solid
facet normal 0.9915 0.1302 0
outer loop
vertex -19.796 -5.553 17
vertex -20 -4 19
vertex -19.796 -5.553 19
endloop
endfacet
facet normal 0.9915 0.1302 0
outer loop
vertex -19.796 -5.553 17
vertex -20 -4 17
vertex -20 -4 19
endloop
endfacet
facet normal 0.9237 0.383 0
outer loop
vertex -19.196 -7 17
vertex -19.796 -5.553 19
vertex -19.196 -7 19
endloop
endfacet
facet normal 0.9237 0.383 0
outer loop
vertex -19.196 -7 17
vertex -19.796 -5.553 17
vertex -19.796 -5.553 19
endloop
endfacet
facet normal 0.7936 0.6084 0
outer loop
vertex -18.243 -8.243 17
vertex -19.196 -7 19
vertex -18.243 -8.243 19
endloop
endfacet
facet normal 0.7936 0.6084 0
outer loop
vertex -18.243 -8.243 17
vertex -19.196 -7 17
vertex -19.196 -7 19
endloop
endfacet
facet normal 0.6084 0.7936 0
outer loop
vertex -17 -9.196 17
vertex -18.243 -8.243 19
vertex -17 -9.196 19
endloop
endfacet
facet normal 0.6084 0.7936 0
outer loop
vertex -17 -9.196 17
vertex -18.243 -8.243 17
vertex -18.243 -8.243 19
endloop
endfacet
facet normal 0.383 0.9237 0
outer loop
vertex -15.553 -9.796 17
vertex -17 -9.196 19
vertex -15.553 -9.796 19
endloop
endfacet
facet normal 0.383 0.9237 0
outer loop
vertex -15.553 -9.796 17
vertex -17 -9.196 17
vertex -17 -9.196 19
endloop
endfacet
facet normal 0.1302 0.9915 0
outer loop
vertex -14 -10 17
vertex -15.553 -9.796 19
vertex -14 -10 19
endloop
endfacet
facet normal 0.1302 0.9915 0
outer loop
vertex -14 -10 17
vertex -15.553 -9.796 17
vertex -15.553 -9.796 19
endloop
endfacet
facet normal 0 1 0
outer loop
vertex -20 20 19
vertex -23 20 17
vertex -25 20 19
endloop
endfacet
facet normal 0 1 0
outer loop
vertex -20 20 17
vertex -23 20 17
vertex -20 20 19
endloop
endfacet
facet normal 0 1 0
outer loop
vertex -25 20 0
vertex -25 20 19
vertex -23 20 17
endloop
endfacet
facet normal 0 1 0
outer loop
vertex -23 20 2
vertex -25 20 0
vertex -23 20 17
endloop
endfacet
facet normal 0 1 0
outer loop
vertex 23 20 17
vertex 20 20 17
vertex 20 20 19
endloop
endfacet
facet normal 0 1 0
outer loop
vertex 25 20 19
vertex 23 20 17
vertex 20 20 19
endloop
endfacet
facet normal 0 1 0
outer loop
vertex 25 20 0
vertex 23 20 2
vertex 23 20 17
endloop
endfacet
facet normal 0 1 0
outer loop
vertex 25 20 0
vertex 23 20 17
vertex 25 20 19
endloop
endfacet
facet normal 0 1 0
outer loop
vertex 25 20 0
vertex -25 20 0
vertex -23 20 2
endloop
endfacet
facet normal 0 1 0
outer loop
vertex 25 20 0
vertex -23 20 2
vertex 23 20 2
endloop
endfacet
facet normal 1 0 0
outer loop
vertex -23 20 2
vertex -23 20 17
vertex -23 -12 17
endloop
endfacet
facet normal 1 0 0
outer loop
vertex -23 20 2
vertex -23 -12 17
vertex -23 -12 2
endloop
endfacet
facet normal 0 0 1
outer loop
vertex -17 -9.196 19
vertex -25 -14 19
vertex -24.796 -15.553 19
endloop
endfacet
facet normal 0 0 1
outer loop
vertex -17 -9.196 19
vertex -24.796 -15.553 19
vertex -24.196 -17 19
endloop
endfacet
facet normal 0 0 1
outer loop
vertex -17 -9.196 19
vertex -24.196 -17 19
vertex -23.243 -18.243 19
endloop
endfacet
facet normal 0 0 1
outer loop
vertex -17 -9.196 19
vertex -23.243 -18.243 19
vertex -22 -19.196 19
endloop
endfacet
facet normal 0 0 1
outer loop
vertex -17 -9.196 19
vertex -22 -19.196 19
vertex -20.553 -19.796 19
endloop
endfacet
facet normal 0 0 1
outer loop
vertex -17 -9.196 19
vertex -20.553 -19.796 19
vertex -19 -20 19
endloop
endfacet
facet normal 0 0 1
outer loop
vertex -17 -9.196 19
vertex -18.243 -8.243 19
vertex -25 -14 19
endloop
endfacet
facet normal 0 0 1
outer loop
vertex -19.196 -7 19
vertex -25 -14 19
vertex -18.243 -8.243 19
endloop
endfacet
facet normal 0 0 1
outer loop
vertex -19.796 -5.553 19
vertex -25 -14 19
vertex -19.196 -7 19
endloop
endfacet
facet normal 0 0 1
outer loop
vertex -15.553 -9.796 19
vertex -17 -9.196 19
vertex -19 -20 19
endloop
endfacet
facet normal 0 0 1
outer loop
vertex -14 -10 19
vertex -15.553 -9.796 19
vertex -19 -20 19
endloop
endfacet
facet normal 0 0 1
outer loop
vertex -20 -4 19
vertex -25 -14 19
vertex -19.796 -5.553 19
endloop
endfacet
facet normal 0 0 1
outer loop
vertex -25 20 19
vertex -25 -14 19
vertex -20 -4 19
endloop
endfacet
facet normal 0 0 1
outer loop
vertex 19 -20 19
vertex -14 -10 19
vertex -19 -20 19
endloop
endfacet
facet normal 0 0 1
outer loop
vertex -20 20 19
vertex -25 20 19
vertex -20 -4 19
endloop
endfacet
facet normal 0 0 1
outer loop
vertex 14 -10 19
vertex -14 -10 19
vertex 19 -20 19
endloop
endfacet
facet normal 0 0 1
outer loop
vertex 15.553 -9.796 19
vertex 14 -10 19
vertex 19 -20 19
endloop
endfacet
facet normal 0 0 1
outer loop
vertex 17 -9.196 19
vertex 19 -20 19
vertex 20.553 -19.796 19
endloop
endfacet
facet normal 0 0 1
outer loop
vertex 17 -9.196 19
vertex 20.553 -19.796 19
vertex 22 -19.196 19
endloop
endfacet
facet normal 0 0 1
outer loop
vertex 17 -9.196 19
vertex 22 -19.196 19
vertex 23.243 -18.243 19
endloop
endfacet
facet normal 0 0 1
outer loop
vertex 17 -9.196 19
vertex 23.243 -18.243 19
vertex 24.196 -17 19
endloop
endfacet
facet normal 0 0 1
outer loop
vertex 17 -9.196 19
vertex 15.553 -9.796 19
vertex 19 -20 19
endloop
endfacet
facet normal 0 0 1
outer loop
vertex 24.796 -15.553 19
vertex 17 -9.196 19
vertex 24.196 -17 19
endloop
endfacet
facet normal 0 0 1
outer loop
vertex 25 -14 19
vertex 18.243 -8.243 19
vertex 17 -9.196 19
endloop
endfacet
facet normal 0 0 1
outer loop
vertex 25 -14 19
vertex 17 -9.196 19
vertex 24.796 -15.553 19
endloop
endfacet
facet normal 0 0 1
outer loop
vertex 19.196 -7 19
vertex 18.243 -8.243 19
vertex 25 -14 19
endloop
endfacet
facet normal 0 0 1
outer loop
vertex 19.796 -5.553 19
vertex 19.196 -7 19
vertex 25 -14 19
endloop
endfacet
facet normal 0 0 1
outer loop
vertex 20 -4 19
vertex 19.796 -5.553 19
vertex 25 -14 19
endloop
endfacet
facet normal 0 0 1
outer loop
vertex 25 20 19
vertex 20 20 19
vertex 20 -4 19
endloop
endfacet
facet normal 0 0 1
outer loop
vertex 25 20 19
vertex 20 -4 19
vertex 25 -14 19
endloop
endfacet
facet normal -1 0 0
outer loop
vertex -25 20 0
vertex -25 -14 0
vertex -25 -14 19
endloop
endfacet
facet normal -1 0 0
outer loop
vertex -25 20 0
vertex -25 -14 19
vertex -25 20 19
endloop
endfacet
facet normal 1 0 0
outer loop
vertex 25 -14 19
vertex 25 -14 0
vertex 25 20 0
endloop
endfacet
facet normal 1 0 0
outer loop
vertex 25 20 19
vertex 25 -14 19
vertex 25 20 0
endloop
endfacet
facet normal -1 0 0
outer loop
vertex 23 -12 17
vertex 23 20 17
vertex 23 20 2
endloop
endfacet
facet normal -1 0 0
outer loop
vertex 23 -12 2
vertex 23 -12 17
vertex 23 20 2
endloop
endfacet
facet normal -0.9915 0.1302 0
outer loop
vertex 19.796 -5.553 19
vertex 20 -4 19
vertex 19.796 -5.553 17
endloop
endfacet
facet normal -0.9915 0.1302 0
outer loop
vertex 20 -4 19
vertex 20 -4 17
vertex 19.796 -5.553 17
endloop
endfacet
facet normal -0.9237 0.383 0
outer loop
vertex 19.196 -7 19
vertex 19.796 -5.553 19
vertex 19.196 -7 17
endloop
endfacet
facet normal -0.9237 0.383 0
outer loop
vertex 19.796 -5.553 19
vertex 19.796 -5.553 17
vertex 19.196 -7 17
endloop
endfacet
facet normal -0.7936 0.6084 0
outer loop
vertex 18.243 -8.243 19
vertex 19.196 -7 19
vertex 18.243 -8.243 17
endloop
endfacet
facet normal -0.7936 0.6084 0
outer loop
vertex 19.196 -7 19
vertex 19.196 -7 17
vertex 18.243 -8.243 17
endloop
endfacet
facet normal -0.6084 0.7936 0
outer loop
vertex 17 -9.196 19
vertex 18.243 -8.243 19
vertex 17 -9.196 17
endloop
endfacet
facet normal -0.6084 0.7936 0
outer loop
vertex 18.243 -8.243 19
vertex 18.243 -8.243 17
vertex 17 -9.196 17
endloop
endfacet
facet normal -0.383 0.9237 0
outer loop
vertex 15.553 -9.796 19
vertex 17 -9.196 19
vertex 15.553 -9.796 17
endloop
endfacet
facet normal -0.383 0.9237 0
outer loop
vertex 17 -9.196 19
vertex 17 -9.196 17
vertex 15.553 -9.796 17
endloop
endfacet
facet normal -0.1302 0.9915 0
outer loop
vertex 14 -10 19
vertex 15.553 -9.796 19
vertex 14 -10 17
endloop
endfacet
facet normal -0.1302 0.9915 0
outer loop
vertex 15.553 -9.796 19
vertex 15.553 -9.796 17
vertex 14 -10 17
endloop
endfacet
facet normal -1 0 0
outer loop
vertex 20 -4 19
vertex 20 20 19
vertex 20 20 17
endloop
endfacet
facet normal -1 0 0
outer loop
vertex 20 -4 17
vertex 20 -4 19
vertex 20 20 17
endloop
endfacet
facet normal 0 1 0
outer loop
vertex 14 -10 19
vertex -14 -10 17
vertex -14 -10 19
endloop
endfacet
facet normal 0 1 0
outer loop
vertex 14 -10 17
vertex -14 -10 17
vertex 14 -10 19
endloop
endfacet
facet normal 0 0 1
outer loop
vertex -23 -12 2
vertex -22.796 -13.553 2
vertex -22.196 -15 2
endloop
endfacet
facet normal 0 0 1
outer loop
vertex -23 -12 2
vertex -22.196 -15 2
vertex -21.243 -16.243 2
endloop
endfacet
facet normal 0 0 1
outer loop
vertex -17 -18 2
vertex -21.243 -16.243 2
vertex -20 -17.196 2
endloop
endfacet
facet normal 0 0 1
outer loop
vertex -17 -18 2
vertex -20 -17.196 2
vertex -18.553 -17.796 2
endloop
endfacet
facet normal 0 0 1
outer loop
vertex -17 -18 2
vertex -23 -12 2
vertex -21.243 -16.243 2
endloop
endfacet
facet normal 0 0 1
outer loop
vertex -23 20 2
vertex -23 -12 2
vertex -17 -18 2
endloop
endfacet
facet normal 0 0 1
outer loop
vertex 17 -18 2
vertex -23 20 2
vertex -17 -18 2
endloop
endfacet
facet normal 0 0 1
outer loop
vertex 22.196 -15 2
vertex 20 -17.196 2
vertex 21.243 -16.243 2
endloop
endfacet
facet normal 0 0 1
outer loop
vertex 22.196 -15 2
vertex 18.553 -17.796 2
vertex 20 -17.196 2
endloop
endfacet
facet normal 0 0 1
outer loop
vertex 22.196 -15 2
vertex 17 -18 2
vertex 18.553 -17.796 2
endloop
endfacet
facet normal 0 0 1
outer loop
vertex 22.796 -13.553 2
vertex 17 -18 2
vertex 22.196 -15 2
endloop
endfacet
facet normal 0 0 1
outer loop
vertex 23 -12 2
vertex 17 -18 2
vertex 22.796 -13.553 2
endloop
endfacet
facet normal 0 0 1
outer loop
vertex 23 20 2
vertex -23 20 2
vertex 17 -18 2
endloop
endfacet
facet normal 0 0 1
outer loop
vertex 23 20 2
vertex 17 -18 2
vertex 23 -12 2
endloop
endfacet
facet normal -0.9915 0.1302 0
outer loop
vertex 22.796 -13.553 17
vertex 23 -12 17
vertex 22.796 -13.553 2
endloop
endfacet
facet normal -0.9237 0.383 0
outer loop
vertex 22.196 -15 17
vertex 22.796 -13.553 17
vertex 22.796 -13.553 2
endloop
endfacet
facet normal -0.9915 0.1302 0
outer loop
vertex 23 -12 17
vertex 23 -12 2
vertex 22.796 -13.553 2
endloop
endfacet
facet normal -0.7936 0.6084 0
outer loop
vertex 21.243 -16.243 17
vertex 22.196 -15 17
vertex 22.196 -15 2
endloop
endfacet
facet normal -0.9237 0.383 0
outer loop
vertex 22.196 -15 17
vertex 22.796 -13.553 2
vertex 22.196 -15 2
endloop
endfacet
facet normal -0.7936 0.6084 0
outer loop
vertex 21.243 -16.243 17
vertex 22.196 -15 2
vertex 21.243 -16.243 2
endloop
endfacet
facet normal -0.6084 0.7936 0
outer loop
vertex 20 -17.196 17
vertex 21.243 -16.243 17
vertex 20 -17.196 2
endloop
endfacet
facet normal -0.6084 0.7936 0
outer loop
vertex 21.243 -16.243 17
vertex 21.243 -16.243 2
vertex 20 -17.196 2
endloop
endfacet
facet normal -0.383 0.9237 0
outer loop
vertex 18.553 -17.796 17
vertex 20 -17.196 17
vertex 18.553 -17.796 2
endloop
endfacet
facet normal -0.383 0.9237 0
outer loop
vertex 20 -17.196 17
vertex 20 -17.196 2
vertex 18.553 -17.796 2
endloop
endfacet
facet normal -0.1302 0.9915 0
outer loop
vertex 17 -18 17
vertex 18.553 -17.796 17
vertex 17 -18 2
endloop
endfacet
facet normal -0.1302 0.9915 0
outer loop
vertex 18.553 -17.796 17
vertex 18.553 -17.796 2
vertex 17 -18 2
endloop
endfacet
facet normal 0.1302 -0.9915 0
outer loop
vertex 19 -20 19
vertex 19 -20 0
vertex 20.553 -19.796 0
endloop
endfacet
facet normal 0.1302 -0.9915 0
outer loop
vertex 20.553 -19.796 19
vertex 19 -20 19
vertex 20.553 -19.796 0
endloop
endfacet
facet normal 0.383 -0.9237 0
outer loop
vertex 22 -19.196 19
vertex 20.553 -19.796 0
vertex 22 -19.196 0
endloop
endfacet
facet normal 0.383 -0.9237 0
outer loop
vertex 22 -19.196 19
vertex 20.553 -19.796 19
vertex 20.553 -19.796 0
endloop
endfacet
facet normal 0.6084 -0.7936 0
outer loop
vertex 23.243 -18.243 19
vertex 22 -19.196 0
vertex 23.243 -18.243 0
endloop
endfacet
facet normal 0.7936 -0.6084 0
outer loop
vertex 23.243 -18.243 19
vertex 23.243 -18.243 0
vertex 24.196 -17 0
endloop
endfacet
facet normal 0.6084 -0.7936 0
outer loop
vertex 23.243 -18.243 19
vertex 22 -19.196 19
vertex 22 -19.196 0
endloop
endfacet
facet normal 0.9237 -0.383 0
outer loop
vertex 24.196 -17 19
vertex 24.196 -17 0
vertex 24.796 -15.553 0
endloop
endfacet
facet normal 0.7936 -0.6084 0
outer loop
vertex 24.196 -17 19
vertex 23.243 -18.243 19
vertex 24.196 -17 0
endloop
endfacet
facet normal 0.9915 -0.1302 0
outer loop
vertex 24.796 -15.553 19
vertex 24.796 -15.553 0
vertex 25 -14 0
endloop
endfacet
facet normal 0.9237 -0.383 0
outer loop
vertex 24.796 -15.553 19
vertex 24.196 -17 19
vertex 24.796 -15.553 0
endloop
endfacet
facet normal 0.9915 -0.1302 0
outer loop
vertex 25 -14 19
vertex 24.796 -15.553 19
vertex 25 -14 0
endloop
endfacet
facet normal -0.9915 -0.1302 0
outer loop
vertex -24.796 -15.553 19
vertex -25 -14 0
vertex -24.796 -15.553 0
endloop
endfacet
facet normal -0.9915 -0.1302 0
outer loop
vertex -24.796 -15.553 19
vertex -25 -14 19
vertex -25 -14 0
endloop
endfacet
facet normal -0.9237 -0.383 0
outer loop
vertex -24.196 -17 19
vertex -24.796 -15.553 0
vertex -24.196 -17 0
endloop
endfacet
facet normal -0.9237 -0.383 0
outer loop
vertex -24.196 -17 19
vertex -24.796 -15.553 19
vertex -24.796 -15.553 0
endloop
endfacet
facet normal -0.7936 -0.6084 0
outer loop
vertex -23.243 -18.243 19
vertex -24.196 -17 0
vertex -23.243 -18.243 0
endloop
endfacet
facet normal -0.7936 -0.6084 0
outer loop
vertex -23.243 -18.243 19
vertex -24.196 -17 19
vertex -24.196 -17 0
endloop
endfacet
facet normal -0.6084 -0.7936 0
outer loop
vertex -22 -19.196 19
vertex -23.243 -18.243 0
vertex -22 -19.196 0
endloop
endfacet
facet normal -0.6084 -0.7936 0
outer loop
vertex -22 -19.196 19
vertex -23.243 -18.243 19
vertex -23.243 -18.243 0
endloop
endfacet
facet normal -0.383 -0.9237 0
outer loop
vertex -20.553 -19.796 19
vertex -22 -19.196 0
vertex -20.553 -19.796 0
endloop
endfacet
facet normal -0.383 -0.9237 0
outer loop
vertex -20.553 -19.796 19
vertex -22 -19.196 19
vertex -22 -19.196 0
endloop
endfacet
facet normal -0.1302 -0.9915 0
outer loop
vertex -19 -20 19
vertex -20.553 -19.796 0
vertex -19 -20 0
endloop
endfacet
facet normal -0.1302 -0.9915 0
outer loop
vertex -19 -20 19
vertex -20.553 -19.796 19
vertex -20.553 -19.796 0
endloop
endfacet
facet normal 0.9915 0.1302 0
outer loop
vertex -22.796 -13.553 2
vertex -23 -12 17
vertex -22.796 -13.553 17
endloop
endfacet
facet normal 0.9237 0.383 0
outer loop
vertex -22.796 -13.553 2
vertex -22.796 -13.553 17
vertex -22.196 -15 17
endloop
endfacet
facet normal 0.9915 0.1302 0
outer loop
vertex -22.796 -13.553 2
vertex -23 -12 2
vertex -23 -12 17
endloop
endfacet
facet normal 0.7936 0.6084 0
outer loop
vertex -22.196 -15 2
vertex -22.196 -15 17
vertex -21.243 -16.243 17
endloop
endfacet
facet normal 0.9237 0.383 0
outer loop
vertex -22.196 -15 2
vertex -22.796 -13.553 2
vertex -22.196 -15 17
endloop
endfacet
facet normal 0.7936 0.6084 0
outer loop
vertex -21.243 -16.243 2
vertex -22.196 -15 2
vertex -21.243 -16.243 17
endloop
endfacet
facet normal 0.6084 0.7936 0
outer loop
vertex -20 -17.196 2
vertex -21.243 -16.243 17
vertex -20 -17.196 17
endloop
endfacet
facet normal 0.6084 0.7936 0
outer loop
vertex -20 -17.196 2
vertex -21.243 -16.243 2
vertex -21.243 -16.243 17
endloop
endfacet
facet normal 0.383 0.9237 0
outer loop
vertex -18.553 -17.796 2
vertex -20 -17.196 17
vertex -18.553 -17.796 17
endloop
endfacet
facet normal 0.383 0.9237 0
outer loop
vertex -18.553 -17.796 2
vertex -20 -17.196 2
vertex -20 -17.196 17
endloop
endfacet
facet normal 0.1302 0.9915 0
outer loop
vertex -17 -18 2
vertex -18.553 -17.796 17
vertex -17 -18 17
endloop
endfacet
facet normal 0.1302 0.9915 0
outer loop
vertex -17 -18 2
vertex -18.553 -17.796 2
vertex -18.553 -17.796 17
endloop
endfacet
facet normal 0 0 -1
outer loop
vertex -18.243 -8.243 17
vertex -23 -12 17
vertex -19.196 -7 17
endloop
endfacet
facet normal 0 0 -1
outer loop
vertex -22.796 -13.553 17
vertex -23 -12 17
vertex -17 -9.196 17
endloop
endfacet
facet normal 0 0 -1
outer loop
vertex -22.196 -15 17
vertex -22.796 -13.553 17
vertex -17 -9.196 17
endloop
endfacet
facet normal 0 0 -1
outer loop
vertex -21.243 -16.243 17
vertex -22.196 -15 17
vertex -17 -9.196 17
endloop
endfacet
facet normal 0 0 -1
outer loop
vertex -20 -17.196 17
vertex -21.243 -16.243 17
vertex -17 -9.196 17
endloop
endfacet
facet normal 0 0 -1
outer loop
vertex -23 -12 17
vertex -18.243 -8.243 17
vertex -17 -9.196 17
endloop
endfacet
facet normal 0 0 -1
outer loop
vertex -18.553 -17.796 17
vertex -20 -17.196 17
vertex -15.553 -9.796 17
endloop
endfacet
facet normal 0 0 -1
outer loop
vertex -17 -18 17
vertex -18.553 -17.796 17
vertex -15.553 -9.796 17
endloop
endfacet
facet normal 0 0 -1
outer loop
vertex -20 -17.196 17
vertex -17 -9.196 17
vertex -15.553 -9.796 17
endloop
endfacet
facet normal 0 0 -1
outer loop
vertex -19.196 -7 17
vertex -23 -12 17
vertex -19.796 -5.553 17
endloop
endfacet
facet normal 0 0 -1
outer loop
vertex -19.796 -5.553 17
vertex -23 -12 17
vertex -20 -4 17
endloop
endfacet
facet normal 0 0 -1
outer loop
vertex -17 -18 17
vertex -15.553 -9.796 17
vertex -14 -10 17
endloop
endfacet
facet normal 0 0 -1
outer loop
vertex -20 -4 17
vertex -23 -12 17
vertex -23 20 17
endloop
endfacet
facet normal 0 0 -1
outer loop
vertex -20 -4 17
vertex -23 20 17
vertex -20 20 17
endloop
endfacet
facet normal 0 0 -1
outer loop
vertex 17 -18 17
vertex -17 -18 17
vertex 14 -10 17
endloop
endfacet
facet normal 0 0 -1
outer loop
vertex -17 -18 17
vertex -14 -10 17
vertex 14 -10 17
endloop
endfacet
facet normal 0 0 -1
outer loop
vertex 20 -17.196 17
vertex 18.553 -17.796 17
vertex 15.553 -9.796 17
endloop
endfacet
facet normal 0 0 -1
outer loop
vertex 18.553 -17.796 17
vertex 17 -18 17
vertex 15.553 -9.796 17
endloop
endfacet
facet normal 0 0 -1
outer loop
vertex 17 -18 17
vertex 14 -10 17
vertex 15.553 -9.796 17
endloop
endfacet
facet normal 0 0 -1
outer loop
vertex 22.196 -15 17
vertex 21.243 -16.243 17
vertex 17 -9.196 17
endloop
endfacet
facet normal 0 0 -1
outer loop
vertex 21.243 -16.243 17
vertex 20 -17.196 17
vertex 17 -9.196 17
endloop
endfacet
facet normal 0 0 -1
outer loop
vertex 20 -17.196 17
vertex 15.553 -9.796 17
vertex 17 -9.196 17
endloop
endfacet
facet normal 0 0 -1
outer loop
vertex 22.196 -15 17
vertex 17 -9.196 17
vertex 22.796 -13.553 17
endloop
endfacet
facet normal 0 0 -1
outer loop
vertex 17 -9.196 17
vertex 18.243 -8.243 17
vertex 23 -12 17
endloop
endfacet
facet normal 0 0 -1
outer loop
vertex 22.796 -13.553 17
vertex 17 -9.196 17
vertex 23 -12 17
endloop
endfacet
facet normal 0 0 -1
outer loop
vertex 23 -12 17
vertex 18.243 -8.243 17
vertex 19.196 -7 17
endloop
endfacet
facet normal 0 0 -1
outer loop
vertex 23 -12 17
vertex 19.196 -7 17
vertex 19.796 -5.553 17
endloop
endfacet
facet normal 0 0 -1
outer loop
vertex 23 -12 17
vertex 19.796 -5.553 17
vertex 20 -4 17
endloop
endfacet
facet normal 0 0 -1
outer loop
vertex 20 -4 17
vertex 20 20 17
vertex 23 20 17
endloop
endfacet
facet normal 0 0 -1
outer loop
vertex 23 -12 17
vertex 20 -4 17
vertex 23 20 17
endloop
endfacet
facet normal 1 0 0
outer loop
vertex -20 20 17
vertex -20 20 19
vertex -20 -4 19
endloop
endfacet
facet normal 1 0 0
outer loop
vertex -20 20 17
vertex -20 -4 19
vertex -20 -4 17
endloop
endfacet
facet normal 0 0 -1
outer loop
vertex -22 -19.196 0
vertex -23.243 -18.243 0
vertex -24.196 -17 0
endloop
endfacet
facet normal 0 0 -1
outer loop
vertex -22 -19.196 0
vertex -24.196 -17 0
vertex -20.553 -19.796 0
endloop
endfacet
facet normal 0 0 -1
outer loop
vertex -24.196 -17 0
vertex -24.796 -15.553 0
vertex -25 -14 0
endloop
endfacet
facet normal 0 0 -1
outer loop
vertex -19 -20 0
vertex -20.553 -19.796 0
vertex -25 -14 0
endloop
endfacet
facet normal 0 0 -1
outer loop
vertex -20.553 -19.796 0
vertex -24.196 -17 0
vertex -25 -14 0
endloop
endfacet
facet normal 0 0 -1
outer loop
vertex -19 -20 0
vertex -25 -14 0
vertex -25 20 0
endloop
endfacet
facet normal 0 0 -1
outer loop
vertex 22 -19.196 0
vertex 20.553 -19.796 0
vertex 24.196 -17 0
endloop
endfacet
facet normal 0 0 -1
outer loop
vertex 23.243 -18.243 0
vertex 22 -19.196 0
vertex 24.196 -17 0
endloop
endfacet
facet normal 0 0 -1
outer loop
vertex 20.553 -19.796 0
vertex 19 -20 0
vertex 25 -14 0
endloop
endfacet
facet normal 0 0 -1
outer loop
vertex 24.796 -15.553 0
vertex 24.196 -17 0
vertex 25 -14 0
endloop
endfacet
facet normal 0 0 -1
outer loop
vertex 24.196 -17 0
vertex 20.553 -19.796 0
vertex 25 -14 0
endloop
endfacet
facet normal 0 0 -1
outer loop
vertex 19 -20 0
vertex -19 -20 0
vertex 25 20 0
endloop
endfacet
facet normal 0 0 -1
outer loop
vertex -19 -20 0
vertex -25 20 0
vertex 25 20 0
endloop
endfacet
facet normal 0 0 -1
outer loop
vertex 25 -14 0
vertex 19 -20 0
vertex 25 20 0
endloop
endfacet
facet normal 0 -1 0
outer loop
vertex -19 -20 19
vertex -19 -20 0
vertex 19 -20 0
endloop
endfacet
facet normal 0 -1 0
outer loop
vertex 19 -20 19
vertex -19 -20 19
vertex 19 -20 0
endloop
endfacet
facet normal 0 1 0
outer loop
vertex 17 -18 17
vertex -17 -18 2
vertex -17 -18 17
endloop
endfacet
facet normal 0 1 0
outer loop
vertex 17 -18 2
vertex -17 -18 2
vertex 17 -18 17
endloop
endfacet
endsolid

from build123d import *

# Parameters (mm, degrees)
SKETCH_1_W          = 50
SKETCH_1_H          = 40
EXTRUDE_1_DEPTH     = 19
SKETCH_2_W          = 46
SKETCH_2_H          = 15
CUT_EXTRUDE_1_DEPTH = 38
SKETCH_3_W          = 40
SKETCH_3_H          = 2
CUT_EXTRUDE_2_DEPTH = 30
FILLET_1_R          = 6


with BuildPart() as part:
    # 스케치1 → 보스-돌출1 (new body)
    with BuildSketch(Plane.XY):
        Rectangle(SKETCH_1_W, SKETCH_1_H)
    extrude(amount=EXTRUDE_1_DEPTH)

    # 스케치2 → 컷-돌출1 (cut)
    with BuildSketch(Plane(origin=(0, 20, 0), x_dir=(1, 0, 0), z_dir=(0, 1, 0))):
        with Locations((0, -9.5)):
            Rectangle(SKETCH_2_W, SKETCH_2_H)
    extrude(amount=-CUT_EXTRUDE_1_DEPTH, mode=Mode.SUBTRACT)

    # 스케치3 → 컷-돌출2 (cut)
    with BuildSketch(Plane(origin=(0, 20, 0), x_dir=(1, 0, 0), z_dir=(0, 1, 0))):
        with Locations((0, -18)):
            Rectangle(SKETCH_3_W, SKETCH_3_H)
    extrude(amount=-CUT_EXTRUDE_2_DEPTH, mode=Mode.SUBTRACT)

    # 필렛1
    fillet_1_edges = [part.edges().sort_by_distance(p)[0] for p in [
        (23, -18, 9.5),
        (-23, -18, 9.5),
        (20, -10, 18),
        (-20, -10, 18),
        (25, -20, 9.5),
        (-25, -20, 9.5),
    ]]
    fillet(fillet_1_edges, radius=FILLET_1_R)


solid = part.part
